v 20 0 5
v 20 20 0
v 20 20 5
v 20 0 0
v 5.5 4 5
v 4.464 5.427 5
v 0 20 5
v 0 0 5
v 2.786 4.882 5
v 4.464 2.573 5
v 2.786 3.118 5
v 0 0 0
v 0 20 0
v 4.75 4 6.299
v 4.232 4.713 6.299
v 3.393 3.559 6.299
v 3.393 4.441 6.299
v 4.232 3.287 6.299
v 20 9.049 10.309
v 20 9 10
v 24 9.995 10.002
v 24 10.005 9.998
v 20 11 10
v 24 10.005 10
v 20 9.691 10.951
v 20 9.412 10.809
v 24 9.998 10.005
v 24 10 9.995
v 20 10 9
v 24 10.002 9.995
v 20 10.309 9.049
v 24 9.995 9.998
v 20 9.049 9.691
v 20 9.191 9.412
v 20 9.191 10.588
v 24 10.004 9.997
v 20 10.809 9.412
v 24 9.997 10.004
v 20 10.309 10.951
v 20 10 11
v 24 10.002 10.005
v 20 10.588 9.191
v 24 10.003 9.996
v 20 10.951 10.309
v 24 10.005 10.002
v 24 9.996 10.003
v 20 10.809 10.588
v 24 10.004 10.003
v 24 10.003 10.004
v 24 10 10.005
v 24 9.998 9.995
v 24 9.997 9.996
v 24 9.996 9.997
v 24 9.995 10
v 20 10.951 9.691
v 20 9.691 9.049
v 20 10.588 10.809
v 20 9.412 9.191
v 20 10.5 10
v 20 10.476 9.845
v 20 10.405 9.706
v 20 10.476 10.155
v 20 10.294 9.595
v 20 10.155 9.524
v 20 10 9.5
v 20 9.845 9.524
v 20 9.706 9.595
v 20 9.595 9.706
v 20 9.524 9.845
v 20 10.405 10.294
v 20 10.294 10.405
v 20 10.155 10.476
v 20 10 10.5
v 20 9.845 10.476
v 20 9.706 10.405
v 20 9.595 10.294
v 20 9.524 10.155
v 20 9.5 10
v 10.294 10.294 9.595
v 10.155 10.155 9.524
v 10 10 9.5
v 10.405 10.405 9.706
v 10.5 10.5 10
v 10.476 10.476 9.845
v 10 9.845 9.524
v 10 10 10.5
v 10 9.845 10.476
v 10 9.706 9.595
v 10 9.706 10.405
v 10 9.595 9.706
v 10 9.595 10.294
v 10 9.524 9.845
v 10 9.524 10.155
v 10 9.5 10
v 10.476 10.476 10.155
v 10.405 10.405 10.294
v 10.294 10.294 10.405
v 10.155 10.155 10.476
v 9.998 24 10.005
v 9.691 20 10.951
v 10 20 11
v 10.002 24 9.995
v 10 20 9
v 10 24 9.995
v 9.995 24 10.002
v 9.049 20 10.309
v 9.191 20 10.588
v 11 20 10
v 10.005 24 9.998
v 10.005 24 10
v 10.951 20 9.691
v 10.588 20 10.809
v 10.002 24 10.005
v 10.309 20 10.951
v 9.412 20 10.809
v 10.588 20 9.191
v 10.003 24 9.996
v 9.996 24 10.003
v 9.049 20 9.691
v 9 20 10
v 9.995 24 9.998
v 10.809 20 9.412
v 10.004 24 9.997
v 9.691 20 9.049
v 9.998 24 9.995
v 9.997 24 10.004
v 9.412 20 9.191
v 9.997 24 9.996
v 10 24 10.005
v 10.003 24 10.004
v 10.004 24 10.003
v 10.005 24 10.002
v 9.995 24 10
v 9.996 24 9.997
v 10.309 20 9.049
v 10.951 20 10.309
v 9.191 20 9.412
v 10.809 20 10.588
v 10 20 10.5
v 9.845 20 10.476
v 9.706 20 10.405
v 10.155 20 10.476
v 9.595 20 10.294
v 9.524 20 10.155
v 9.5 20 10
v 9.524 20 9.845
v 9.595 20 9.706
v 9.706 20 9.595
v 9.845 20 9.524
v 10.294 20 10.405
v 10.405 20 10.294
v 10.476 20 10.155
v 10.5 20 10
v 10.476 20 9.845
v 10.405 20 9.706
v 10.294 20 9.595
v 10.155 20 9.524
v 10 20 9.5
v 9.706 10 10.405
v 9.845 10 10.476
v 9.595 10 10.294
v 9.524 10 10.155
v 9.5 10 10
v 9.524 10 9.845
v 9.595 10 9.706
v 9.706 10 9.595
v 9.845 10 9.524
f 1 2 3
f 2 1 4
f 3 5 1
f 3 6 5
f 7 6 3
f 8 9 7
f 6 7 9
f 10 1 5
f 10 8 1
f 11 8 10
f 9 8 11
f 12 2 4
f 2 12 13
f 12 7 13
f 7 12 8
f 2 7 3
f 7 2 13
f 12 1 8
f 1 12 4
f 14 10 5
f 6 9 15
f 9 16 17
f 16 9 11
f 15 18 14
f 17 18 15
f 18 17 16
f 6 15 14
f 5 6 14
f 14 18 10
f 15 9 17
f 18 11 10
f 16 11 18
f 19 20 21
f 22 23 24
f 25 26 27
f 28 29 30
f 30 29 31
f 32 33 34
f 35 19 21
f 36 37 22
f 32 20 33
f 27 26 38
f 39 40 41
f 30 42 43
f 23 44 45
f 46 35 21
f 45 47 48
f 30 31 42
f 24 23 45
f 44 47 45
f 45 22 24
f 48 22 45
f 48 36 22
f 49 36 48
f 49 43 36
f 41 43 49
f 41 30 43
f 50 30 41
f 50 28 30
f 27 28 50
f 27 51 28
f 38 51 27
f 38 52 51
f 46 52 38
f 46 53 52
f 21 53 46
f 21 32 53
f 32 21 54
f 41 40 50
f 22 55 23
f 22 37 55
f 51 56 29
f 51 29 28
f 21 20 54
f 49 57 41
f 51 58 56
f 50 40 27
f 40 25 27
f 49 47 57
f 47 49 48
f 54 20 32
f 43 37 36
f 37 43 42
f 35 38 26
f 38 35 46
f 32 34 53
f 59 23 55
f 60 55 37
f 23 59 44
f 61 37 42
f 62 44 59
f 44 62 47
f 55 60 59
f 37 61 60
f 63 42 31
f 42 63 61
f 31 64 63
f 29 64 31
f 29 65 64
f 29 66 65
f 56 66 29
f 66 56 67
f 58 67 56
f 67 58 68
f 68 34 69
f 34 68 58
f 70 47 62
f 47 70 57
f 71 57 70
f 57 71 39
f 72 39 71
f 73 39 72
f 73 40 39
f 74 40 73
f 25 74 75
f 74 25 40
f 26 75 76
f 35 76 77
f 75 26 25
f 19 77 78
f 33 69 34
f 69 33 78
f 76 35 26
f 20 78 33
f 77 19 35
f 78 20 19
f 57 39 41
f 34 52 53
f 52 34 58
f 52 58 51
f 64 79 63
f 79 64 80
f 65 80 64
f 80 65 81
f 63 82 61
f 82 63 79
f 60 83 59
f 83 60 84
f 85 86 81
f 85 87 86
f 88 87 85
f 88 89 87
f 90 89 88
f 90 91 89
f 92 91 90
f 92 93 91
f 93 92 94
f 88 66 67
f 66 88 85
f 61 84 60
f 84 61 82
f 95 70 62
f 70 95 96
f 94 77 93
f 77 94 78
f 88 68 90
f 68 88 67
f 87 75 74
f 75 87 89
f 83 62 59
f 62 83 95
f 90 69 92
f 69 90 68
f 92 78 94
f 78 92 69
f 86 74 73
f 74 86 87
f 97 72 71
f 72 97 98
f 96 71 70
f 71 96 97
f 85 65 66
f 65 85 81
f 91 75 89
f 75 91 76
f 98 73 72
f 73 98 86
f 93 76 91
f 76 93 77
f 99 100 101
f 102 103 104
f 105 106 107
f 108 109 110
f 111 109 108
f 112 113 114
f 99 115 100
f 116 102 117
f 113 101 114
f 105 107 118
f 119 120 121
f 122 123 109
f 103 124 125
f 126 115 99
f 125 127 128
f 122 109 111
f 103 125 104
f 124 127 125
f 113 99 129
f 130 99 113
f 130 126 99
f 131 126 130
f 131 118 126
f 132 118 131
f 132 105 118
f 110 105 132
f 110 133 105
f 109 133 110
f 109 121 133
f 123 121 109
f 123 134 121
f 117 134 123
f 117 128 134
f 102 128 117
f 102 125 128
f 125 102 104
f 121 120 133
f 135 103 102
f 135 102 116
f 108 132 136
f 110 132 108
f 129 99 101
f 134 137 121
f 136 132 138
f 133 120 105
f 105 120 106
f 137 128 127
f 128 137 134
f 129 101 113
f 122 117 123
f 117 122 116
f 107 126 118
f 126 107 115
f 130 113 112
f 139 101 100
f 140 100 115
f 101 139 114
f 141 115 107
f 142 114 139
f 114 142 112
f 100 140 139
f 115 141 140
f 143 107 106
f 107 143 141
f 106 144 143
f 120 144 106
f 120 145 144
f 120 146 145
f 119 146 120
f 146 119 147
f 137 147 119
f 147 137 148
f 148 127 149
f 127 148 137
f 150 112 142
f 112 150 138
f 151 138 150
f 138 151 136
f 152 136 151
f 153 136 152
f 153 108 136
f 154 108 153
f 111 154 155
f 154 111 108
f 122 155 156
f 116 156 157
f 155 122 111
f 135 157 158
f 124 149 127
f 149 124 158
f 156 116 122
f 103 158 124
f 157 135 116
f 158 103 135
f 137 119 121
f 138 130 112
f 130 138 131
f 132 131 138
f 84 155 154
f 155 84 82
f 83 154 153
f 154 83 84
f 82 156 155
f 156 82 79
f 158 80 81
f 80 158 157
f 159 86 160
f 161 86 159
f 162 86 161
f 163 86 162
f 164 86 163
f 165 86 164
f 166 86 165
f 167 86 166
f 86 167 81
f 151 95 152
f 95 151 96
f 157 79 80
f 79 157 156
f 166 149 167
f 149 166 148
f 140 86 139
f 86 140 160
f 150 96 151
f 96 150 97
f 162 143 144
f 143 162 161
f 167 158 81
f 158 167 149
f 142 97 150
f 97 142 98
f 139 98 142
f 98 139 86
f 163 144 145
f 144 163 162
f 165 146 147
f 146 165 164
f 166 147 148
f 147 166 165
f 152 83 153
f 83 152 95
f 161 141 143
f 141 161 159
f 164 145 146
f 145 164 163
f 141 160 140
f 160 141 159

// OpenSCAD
// file: axes.scad
module arrow(){
   body_h = 10;
   d = 1;
   arrow_base = 2;
   arrow_head_length = 4;
   
   translate([0,0,body_h]){
   cylinder ( d1 = arrow_base, d2 = 0.01, h =arrow_head_length, $fn = 20);
   }
   cylinder( d= 1, h = body_h,$fn = 20);
}

module rotation_arrow_rhs(){
rotate_extrude(angle = 120){
   translate([4,0,0]){
      circle ( d= 1, $fn = 20);
   }
}
rotate([0,0,120]){ 

rotate([90,0,0]){
      translate([4,0,-2]){
      cylinder ( d1 = 0.01, d2 = 1.75, h =2.5, $fn = 20);
   }
}
}
}
module rotation_arrow_lhs(){
   mirror([0,1,0]){
      rotation_arrow_rhs();
   }
}




module arrow_n_rotation_arrow_rhs(){
   arrow();
translate([0,0,9]){
rotation_arrow_rhs();
}
}

module arrow_n_rotation_arrow_lhs(){
   arrow();
translate([0,0,9]){
rotation_arrow_lhs();
}
}

//arrow();
module RHR_axes(){
   color("red"){
      translate([15,-2,-2]){
         rotate([0,-90,0]){
            text("X", size = 4);
         }
      }
      rotate([0,90,0]){
         children(0);
      }
   }  
   color("green"){
      translate([-2,15,-2]){
         rotate([90,0,0]){
            text("Y", size = 4);
         }
      }
      rotate([-90,0,0]){
       children(1);
      }
   }   
   
   color("blue"){
   translate([-2,-2,15]){
       rotate([0,0,0]){
          text("Z", size = 4);
       }
   }
   rotate([0,0,0]){
      children(2);
      }
   }   
   
}


RHR_axes(){
   arrow_n_rotation_arrow_rhs(); 
   arrow_n_rotation_arrow_rhs();
   arrow_n_rotation_arrow_rhs();
}




//RHR_axes();
// main file
use <axes.scad>

module arrow_axes(){
   RHR_axes(){arrow();arrow(); arrow();}
}

module ic(){
   cube([20,20,5]);
   translate([4,4,5]){
      sphere( d = 3);
   }
}


ic();
translate([10,10,10]){
arrow_axes();
}
